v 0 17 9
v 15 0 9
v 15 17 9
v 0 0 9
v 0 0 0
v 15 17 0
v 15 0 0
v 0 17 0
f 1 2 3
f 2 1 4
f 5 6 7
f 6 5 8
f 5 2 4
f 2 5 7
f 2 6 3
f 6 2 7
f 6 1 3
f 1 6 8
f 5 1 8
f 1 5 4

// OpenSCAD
// Generated by SolidPython 1.0.1 on 2020-07-29 00:46:55


cube(size = [15, 17, 9]);
/***********************************************
*********      SolidPython code:      **********
************************************************
 
# import packages: SolidPython
from solid import *
from solid.utils import *
from itertools import chain, combinations, permutations


class Resize:

    def __init__(self, scad_file):
        self.scad_file = scad_file
        #self.scad_file = import_scad(scad_file)
        # cone/cylinder param:
        self.r1 = 0
        self.r2 = 0
        self.h = 0
        # rectangular prism param:
        self.w = 0
        self.l = 0
        # ellipse param:
        self.r = 0

    # import OpenScad code (file name corresponds to shape)


    # classify shape + parameters
    def assign(self, param1, param2, param3):
        if self.scad_file == 'cone.scad':
            self.r1 = param1
            self.r2 = param2
            self.h = param3
        elif self.scad_file == 'cylinder.scad':
            self.r1 = param1
            self.r2 = param2
            self.h = param3
        elif self.scad_file == 'rectangularPrism.scad':
            self.h = param1
            self.l = param2
            self.w = param3
        else:
            self.r = param1
            self.h = param2

    # resize parameters
    def iterate(self):
        x = range(3, 20, 2)
        i = 1
        if self.scad_file == 'cone.scad':
            tempList = list(permutations(x, 2))
            for temp in tempList:
                param1 = temp[0]
                param2 = temp[1]
                filepath = 'produced_scad_files/' + 'cone' + str(param1) + '_' + str(param2) + '_' + '.scad'
                scad_render_to_file(cylinder(h=param1, r1=param2, r2=0), filepath)

        elif self.scad_file == 'cylinder.scad':
            tempList = list(permutations(x, 3))
            for temp in tempList:
                param1 = temp[0]
                param2 = temp[1]
                filepath = 'produced_scad_files/' + 'cylinder' + str(param1) + '_' + str(param2) + '_' + '.scad'
                scad_render_to_file(cylinder(h=param1, r1=param2, r2=param2), filepath)

        elif self.scad_file == 'rectangularPrism.scad':
            tempList = list(permutations(x, 3))
            for temp in tempList:
                param1 = temp[0]
                param2 = temp[1]
                param3 = temp[2]
                filepath = 'produced_scad_files/' + 'rectangularPrism' + str(param1) + '_' + str(param2) + '_' + str(
                    param3) + '.scad'
                scad_render_to_file(cube(size=(param1, param2, param3)), filepath)

        elif self.scad_file == 'ellipse.scad':
            tempList = list(permutations(x, 4))
            for temp in tempList:
                param1 = temp[0]
                param2 = temp[1]
                param3 = temp[2]
                param4 = temp[3]
                filepath = 'produced_scad_files/' + 'ellipse' + str(param1) + '_' + str(param2) + '_' + str(param3) + '_' + str(param4) + '.scad'
                scad_render_to_file(scale([param1, param2, param3])(sphere(r=param4)), filepath)

    def render_to_scadfile(self):
        scad_render_to_file(scad, 'example.scad') 
 
************************************************/
